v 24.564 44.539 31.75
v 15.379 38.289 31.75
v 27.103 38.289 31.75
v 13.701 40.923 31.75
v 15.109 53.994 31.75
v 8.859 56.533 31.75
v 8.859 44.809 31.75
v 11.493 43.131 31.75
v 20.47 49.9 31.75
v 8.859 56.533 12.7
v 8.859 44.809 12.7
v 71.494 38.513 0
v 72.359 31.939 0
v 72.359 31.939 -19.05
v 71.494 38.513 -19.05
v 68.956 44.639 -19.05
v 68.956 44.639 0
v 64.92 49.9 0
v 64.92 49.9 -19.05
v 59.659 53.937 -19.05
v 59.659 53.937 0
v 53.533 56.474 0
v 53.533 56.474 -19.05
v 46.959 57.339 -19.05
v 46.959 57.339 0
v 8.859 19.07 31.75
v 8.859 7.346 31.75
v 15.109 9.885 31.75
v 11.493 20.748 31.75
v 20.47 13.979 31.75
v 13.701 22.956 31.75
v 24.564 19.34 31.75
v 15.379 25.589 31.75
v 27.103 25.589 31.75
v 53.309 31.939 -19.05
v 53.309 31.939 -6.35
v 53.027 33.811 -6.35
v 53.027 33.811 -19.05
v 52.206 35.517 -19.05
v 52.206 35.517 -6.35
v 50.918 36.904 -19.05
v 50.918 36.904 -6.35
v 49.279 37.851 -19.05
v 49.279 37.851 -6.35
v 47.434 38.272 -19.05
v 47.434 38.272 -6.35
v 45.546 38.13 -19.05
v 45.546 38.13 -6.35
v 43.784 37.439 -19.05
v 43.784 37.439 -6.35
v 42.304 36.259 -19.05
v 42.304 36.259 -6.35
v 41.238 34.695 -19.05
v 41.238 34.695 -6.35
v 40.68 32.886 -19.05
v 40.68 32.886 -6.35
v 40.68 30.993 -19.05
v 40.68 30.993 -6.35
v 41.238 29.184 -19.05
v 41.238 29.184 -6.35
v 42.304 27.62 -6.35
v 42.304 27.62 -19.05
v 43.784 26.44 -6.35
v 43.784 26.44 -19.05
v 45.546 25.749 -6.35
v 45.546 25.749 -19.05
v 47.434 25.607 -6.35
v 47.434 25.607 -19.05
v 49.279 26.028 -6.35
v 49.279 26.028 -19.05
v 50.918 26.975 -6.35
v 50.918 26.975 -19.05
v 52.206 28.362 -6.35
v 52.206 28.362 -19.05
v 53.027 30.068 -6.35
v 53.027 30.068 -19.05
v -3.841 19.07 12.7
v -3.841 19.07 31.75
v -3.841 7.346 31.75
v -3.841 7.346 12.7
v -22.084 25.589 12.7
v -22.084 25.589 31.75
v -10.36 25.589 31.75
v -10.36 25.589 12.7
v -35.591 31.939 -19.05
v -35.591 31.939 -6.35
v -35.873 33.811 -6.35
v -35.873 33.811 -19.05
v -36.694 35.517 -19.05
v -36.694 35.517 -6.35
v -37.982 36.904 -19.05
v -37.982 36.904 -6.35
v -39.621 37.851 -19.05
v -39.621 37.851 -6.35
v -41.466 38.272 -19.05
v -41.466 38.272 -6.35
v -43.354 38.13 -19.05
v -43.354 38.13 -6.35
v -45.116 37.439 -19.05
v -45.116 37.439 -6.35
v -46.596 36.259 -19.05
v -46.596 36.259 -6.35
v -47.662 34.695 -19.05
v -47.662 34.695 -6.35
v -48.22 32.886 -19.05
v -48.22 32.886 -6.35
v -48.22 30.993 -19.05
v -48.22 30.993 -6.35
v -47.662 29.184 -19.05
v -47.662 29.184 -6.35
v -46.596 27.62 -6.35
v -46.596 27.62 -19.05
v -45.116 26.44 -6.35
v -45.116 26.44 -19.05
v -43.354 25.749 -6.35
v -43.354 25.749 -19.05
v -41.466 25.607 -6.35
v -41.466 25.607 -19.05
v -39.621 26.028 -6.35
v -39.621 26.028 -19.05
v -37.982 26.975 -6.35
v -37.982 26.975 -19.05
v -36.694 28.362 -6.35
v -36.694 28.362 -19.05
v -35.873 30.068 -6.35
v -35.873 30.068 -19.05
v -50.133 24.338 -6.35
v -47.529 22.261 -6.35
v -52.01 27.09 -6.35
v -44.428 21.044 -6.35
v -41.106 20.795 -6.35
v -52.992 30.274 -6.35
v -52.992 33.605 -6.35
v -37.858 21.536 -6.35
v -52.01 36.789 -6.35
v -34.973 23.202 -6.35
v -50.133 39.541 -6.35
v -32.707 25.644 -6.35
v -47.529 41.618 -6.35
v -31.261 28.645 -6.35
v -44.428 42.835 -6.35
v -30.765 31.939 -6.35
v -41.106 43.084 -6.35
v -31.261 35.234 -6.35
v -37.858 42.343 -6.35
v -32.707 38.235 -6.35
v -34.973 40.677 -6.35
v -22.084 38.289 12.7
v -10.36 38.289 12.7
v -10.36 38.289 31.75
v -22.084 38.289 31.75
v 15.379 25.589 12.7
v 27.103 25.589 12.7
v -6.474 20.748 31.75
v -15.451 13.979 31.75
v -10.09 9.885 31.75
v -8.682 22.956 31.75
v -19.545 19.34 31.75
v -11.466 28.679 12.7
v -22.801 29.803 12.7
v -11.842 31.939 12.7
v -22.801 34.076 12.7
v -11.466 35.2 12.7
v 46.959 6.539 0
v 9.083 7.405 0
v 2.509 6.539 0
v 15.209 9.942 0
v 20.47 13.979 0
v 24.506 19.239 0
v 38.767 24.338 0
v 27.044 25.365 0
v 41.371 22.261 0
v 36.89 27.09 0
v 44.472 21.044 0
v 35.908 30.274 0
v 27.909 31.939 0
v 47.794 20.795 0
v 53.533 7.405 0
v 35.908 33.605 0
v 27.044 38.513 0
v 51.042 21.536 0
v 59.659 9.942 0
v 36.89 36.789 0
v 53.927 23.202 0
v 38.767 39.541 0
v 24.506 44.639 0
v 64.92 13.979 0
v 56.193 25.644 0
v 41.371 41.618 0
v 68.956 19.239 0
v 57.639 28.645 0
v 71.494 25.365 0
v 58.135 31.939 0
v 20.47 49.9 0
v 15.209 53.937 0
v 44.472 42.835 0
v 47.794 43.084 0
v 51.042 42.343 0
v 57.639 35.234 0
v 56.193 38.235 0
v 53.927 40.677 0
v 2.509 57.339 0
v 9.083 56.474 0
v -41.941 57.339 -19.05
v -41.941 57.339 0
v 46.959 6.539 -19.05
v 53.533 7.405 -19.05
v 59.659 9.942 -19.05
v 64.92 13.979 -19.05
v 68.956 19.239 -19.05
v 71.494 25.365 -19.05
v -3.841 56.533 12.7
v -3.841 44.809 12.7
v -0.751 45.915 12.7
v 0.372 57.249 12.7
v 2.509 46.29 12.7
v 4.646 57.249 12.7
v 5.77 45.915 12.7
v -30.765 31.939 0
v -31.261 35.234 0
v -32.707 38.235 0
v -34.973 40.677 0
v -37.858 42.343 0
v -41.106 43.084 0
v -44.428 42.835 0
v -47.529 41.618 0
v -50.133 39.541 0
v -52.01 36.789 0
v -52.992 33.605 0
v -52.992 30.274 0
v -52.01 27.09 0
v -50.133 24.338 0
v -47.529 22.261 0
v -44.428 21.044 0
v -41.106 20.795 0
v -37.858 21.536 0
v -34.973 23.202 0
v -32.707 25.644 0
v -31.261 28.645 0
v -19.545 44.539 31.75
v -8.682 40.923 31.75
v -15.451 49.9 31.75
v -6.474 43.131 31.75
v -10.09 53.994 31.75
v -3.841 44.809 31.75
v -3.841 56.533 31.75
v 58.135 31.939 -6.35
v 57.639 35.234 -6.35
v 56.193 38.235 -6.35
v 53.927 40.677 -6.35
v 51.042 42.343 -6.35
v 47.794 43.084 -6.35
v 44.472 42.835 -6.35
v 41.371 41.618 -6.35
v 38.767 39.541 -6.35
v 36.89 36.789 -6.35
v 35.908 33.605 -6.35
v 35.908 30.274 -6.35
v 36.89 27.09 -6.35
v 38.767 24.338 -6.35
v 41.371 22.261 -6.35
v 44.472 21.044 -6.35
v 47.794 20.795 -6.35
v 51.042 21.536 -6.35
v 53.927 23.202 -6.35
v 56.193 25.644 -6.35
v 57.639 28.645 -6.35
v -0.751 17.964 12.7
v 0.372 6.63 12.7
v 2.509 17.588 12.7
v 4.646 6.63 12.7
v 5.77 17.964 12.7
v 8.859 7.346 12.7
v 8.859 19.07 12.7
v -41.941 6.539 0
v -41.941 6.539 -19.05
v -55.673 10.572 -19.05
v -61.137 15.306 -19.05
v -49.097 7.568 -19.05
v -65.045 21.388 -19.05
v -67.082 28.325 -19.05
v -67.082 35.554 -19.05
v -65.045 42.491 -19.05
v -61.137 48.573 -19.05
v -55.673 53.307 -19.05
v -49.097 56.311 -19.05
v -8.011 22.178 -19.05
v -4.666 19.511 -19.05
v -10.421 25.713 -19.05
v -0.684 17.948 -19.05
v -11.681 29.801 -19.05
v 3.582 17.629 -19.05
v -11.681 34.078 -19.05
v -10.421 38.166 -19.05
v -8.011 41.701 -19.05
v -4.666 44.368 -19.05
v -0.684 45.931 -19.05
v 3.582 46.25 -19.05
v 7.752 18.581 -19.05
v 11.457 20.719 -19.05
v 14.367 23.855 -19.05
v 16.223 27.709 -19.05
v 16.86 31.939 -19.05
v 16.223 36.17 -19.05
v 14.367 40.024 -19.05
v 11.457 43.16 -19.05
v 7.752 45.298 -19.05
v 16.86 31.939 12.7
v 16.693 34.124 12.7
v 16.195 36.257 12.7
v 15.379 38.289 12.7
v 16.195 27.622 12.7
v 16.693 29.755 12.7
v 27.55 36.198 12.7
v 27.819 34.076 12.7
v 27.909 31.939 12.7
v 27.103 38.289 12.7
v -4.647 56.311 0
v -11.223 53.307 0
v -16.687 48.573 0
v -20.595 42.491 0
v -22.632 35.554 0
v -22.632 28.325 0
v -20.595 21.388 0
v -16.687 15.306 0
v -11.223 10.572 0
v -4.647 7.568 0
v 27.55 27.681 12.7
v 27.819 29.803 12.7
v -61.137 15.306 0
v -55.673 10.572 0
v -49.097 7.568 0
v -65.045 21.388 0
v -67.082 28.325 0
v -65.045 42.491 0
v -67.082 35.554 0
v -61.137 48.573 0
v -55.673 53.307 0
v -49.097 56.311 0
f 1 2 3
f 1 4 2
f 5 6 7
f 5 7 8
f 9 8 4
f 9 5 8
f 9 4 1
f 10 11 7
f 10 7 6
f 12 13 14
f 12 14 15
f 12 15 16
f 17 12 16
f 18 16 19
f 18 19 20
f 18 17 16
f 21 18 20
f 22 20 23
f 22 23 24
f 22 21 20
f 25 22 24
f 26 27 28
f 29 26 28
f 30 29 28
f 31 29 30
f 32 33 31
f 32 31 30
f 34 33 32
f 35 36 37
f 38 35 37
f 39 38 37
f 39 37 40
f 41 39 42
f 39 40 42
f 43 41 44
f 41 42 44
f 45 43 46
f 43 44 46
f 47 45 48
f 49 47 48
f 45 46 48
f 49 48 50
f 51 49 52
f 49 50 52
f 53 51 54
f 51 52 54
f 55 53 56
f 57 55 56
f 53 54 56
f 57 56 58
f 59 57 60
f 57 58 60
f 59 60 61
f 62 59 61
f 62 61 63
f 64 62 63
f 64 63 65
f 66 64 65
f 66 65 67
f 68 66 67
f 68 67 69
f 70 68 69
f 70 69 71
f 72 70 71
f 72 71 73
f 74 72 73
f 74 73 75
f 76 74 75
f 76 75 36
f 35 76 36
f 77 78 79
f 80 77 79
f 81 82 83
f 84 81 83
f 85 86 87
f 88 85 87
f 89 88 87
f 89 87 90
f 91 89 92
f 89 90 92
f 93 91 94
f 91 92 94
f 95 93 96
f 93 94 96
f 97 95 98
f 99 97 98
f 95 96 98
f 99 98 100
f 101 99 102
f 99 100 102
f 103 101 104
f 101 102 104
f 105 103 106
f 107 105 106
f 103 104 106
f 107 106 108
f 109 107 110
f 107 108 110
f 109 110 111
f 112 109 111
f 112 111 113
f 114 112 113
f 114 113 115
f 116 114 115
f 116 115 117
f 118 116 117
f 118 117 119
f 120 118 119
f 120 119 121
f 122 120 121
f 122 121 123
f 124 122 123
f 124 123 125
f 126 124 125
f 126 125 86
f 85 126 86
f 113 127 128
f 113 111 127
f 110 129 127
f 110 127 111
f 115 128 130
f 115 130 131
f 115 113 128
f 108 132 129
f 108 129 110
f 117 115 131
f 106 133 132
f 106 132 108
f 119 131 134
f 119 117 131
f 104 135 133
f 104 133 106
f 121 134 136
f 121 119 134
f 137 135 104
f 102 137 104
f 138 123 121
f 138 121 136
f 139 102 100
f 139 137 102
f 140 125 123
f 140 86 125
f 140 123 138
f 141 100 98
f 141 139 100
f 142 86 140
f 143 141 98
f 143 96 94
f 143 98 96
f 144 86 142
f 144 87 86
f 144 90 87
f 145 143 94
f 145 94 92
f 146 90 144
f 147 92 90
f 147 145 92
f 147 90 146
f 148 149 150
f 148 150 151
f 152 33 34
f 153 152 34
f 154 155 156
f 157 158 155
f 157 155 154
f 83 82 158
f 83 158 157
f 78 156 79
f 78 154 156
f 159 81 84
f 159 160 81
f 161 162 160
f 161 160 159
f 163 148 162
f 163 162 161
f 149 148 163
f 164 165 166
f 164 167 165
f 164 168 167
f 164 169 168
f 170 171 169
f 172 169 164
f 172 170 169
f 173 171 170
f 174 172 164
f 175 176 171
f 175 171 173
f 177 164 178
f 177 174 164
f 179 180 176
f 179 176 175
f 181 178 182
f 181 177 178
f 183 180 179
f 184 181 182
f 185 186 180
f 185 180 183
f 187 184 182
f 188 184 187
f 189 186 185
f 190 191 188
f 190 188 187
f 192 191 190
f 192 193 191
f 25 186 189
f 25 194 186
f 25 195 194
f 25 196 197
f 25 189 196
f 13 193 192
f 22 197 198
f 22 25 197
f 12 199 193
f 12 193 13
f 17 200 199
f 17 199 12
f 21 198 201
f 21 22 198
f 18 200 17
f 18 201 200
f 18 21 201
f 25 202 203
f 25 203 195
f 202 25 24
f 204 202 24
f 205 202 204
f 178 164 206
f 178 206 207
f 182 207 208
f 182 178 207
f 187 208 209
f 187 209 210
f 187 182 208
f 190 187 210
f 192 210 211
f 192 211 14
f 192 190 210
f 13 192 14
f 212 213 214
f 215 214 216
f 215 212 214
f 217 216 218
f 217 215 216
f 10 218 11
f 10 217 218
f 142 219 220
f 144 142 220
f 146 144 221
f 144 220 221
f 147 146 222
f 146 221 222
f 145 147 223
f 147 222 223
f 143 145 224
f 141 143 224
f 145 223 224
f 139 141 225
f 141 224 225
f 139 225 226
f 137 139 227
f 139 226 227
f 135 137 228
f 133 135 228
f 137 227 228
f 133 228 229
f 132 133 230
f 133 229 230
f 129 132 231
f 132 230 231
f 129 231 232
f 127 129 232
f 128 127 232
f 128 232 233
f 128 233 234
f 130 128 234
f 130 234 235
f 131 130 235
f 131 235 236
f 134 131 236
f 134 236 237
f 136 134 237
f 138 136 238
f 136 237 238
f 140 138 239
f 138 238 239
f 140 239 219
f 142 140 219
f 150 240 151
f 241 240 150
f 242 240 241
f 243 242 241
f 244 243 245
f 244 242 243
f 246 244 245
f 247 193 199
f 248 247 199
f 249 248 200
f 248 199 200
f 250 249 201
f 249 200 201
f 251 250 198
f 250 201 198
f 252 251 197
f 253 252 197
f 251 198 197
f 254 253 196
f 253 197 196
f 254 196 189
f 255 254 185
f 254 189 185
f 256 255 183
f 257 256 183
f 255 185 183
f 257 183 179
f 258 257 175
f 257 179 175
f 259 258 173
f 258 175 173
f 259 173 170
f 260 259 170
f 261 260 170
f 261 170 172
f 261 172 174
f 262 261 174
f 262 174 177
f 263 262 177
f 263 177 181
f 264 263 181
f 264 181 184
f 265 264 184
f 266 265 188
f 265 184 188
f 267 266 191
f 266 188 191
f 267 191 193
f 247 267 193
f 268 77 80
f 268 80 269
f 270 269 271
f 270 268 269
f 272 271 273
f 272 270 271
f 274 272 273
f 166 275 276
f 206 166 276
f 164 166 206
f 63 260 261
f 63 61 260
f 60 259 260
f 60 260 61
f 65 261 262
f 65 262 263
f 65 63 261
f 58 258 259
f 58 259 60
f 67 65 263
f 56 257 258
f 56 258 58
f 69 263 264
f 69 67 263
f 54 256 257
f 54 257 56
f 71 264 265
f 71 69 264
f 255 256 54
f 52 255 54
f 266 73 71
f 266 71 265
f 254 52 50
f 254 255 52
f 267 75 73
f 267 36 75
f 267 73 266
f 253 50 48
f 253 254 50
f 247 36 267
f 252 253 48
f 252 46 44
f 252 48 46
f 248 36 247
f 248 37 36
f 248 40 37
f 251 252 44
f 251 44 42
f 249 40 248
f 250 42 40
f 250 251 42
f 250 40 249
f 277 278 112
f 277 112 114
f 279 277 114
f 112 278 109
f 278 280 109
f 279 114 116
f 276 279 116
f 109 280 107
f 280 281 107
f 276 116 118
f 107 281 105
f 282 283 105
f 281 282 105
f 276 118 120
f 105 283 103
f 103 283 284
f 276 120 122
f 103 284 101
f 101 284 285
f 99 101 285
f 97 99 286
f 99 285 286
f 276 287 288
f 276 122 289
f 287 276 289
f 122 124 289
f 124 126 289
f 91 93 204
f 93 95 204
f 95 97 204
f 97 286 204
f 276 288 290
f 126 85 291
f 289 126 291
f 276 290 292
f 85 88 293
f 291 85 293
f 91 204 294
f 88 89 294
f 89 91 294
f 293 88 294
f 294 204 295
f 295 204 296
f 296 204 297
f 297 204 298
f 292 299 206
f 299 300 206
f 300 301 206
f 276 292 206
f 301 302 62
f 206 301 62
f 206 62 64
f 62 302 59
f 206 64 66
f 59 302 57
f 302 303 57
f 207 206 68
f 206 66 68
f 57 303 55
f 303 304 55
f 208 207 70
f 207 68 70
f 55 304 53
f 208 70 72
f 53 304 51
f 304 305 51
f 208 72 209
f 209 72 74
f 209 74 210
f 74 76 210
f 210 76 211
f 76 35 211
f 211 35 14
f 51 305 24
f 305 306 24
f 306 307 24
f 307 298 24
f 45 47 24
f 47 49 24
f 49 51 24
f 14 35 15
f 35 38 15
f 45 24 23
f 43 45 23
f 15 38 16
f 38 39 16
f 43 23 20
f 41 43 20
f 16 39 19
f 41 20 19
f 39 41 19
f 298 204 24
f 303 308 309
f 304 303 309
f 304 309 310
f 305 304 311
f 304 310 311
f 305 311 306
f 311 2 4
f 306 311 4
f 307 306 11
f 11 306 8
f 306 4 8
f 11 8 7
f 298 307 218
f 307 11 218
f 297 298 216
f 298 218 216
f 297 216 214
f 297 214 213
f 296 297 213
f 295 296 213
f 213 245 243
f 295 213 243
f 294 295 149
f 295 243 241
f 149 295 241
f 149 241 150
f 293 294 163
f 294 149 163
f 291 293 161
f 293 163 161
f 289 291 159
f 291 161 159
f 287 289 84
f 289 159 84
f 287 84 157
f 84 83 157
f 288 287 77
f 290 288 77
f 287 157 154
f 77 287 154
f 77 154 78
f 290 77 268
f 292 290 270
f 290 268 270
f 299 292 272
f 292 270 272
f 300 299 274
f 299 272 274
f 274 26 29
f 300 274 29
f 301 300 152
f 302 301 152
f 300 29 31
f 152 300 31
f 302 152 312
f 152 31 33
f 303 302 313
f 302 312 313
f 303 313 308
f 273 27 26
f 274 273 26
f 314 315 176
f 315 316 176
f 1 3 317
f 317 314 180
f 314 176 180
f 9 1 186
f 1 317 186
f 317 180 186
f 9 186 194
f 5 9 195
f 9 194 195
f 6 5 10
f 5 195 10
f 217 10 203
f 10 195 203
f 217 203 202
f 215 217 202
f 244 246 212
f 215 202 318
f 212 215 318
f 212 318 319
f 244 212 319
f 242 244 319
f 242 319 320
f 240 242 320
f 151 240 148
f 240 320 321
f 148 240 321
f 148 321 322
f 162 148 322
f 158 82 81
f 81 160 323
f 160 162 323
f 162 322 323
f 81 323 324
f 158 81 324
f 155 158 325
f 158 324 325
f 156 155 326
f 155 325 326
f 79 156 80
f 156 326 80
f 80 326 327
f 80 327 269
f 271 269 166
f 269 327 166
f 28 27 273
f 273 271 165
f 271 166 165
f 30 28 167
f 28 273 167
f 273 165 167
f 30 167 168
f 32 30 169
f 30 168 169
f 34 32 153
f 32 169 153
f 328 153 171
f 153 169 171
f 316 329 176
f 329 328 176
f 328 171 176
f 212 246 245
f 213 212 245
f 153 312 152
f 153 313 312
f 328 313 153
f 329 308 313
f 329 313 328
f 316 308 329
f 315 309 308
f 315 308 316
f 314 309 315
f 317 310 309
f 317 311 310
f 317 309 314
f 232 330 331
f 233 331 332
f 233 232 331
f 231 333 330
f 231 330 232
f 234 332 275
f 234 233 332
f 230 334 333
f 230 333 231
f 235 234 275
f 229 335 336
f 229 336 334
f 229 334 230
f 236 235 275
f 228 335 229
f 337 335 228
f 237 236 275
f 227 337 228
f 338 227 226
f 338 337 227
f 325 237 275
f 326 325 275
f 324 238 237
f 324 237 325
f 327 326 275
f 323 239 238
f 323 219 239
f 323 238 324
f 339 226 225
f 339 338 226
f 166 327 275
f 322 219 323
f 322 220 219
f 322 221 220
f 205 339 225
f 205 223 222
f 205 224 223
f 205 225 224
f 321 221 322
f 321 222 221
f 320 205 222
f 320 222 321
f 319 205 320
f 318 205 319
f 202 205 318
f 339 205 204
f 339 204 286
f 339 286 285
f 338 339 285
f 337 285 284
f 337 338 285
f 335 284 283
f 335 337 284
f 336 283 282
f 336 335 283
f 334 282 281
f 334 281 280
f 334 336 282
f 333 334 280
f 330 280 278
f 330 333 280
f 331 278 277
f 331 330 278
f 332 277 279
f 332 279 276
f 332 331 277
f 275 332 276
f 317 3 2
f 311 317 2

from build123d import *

# Parameters (mm, degrees)
F1_DEPTH  = 19.05
F2_R      = 11.176
F3_DEPTH  = 6.35
F4_R      = 6.35
F5_DEPTH  = 19.051
F6_R      = 25.4
F7_DEPTH  = 31.75
F8_R      = 14.351
F9_DEPTH  = 50.801
F11_DEPTH = 19.05
F13_DEPTH = 19.05


with BuildPart() as f1:
    # F0 (on Top) → F1 (new body)
    with BuildSketch(Plane.XY):
        with BuildLine():
            ThreePointArc((-41.940726, 57.339477), (-23.980214, 49.899989), (-16.540726, 31.939477))
            ThreePointArc((-16.540726, 31.939477), (-23.980214, 13.978964), (-41.940726, 6.539477))
            Line((-41.940726, 6.539477), (46.959274, 6.539477))
            ThreePointArc((46.959274, 6.539477), (21.559274, 31.939477), (46.959274, 57.339477))
            Line((46.959274, 57.339477), (-41.940726, 57.339477))
        make_face()
        with BuildLine():
            ThreePointArc((-41.940726, 6.539477), (-23.980214, 13.978964), (-16.540726, 31.939477))
            ThreePointArc((-16.540726, 31.939477), (-23.980214, 49.899989), (-41.940726, 57.339477))
            ThreePointArc((-41.940726, 57.339477), (-67.340726, 31.939477), (-41.940726, 6.539477))
        make_face()
        with BuildLine():
            ThreePointArc((72.359274, 31.939477), (64.919786, 49.899989), (46.959274, 57.339477))
            ThreePointArc((46.959274, 57.339477), (21.559274, 31.939477), (46.959274, 6.539477))
            ThreePointArc((46.959274, 6.539477), (64.919786, 13.978964), (72.359274, 31.939477))
        make_face()
    extrude(amount=-F1_DEPTH)

    # F2 (on face) → F3 (cut)
    with BuildSketch(Plane.XY):
        with Locations((-41.940726, 31.939477)):
            Circle(F2_R)
        with Locations((46.959274, 31.939477)):
            Circle(F2_R)
    extrude(amount=-F3_DEPTH, mode=Mode.SUBTRACT)

    # F4 (on face) → F5 (cut, through all)
    with BuildSketch(Plane.XY):
        with Locations((-41.940726, 31.939477)):
            Circle(F4_R)
        with Locations((46.959274, 31.939477)):
            Circle(F4_R)
    extrude(amount=-F5_DEPTH, mode=Mode.SUBTRACT)

    # F6 (on face) → F7 (join)
    with BuildSketch(Plane.XY):
        with Locations((2.509274, 31.939477)):
            Circle(F6_R)
    extrude(amount=F7_DEPTH)

    # F8 (on face) → F9 (cut, through all)
    with BuildSketch(Plane.XY.offset(31.75)):
        with Locations((2.509274, 31.939477)):
            Circle(F8_R)
    extrude(amount=-F9_DEPTH, mode=Mode.SUBTRACT)

    # F10 (on face) → F11 (cut)
    with BuildSketch(Plane.XY.offset(31.75)):
        Polygon((8.859274, 57.339477), (2.509274, 57.339477), (-3.840726, 57.339477), (-3.840726, 6.539477), (8.859274, 6.539477), align=None)
    extrude(amount=-F11_DEPTH, mode=Mode.SUBTRACT)

    # F12 (on face) → F13 (cut)
    with BuildSketch(Plane.XY.offset(31.75)):
        Polygon((27.909274, 25.589477), (27.909274, 31.939477), (27.909274, 38.289477), (-22.890726, 38.289477), (-22.890726, 25.589477), align=None)
    extrude(amount=-F13_DEPTH, mode=Mode.SUBTRACT)


solid = f1.part
